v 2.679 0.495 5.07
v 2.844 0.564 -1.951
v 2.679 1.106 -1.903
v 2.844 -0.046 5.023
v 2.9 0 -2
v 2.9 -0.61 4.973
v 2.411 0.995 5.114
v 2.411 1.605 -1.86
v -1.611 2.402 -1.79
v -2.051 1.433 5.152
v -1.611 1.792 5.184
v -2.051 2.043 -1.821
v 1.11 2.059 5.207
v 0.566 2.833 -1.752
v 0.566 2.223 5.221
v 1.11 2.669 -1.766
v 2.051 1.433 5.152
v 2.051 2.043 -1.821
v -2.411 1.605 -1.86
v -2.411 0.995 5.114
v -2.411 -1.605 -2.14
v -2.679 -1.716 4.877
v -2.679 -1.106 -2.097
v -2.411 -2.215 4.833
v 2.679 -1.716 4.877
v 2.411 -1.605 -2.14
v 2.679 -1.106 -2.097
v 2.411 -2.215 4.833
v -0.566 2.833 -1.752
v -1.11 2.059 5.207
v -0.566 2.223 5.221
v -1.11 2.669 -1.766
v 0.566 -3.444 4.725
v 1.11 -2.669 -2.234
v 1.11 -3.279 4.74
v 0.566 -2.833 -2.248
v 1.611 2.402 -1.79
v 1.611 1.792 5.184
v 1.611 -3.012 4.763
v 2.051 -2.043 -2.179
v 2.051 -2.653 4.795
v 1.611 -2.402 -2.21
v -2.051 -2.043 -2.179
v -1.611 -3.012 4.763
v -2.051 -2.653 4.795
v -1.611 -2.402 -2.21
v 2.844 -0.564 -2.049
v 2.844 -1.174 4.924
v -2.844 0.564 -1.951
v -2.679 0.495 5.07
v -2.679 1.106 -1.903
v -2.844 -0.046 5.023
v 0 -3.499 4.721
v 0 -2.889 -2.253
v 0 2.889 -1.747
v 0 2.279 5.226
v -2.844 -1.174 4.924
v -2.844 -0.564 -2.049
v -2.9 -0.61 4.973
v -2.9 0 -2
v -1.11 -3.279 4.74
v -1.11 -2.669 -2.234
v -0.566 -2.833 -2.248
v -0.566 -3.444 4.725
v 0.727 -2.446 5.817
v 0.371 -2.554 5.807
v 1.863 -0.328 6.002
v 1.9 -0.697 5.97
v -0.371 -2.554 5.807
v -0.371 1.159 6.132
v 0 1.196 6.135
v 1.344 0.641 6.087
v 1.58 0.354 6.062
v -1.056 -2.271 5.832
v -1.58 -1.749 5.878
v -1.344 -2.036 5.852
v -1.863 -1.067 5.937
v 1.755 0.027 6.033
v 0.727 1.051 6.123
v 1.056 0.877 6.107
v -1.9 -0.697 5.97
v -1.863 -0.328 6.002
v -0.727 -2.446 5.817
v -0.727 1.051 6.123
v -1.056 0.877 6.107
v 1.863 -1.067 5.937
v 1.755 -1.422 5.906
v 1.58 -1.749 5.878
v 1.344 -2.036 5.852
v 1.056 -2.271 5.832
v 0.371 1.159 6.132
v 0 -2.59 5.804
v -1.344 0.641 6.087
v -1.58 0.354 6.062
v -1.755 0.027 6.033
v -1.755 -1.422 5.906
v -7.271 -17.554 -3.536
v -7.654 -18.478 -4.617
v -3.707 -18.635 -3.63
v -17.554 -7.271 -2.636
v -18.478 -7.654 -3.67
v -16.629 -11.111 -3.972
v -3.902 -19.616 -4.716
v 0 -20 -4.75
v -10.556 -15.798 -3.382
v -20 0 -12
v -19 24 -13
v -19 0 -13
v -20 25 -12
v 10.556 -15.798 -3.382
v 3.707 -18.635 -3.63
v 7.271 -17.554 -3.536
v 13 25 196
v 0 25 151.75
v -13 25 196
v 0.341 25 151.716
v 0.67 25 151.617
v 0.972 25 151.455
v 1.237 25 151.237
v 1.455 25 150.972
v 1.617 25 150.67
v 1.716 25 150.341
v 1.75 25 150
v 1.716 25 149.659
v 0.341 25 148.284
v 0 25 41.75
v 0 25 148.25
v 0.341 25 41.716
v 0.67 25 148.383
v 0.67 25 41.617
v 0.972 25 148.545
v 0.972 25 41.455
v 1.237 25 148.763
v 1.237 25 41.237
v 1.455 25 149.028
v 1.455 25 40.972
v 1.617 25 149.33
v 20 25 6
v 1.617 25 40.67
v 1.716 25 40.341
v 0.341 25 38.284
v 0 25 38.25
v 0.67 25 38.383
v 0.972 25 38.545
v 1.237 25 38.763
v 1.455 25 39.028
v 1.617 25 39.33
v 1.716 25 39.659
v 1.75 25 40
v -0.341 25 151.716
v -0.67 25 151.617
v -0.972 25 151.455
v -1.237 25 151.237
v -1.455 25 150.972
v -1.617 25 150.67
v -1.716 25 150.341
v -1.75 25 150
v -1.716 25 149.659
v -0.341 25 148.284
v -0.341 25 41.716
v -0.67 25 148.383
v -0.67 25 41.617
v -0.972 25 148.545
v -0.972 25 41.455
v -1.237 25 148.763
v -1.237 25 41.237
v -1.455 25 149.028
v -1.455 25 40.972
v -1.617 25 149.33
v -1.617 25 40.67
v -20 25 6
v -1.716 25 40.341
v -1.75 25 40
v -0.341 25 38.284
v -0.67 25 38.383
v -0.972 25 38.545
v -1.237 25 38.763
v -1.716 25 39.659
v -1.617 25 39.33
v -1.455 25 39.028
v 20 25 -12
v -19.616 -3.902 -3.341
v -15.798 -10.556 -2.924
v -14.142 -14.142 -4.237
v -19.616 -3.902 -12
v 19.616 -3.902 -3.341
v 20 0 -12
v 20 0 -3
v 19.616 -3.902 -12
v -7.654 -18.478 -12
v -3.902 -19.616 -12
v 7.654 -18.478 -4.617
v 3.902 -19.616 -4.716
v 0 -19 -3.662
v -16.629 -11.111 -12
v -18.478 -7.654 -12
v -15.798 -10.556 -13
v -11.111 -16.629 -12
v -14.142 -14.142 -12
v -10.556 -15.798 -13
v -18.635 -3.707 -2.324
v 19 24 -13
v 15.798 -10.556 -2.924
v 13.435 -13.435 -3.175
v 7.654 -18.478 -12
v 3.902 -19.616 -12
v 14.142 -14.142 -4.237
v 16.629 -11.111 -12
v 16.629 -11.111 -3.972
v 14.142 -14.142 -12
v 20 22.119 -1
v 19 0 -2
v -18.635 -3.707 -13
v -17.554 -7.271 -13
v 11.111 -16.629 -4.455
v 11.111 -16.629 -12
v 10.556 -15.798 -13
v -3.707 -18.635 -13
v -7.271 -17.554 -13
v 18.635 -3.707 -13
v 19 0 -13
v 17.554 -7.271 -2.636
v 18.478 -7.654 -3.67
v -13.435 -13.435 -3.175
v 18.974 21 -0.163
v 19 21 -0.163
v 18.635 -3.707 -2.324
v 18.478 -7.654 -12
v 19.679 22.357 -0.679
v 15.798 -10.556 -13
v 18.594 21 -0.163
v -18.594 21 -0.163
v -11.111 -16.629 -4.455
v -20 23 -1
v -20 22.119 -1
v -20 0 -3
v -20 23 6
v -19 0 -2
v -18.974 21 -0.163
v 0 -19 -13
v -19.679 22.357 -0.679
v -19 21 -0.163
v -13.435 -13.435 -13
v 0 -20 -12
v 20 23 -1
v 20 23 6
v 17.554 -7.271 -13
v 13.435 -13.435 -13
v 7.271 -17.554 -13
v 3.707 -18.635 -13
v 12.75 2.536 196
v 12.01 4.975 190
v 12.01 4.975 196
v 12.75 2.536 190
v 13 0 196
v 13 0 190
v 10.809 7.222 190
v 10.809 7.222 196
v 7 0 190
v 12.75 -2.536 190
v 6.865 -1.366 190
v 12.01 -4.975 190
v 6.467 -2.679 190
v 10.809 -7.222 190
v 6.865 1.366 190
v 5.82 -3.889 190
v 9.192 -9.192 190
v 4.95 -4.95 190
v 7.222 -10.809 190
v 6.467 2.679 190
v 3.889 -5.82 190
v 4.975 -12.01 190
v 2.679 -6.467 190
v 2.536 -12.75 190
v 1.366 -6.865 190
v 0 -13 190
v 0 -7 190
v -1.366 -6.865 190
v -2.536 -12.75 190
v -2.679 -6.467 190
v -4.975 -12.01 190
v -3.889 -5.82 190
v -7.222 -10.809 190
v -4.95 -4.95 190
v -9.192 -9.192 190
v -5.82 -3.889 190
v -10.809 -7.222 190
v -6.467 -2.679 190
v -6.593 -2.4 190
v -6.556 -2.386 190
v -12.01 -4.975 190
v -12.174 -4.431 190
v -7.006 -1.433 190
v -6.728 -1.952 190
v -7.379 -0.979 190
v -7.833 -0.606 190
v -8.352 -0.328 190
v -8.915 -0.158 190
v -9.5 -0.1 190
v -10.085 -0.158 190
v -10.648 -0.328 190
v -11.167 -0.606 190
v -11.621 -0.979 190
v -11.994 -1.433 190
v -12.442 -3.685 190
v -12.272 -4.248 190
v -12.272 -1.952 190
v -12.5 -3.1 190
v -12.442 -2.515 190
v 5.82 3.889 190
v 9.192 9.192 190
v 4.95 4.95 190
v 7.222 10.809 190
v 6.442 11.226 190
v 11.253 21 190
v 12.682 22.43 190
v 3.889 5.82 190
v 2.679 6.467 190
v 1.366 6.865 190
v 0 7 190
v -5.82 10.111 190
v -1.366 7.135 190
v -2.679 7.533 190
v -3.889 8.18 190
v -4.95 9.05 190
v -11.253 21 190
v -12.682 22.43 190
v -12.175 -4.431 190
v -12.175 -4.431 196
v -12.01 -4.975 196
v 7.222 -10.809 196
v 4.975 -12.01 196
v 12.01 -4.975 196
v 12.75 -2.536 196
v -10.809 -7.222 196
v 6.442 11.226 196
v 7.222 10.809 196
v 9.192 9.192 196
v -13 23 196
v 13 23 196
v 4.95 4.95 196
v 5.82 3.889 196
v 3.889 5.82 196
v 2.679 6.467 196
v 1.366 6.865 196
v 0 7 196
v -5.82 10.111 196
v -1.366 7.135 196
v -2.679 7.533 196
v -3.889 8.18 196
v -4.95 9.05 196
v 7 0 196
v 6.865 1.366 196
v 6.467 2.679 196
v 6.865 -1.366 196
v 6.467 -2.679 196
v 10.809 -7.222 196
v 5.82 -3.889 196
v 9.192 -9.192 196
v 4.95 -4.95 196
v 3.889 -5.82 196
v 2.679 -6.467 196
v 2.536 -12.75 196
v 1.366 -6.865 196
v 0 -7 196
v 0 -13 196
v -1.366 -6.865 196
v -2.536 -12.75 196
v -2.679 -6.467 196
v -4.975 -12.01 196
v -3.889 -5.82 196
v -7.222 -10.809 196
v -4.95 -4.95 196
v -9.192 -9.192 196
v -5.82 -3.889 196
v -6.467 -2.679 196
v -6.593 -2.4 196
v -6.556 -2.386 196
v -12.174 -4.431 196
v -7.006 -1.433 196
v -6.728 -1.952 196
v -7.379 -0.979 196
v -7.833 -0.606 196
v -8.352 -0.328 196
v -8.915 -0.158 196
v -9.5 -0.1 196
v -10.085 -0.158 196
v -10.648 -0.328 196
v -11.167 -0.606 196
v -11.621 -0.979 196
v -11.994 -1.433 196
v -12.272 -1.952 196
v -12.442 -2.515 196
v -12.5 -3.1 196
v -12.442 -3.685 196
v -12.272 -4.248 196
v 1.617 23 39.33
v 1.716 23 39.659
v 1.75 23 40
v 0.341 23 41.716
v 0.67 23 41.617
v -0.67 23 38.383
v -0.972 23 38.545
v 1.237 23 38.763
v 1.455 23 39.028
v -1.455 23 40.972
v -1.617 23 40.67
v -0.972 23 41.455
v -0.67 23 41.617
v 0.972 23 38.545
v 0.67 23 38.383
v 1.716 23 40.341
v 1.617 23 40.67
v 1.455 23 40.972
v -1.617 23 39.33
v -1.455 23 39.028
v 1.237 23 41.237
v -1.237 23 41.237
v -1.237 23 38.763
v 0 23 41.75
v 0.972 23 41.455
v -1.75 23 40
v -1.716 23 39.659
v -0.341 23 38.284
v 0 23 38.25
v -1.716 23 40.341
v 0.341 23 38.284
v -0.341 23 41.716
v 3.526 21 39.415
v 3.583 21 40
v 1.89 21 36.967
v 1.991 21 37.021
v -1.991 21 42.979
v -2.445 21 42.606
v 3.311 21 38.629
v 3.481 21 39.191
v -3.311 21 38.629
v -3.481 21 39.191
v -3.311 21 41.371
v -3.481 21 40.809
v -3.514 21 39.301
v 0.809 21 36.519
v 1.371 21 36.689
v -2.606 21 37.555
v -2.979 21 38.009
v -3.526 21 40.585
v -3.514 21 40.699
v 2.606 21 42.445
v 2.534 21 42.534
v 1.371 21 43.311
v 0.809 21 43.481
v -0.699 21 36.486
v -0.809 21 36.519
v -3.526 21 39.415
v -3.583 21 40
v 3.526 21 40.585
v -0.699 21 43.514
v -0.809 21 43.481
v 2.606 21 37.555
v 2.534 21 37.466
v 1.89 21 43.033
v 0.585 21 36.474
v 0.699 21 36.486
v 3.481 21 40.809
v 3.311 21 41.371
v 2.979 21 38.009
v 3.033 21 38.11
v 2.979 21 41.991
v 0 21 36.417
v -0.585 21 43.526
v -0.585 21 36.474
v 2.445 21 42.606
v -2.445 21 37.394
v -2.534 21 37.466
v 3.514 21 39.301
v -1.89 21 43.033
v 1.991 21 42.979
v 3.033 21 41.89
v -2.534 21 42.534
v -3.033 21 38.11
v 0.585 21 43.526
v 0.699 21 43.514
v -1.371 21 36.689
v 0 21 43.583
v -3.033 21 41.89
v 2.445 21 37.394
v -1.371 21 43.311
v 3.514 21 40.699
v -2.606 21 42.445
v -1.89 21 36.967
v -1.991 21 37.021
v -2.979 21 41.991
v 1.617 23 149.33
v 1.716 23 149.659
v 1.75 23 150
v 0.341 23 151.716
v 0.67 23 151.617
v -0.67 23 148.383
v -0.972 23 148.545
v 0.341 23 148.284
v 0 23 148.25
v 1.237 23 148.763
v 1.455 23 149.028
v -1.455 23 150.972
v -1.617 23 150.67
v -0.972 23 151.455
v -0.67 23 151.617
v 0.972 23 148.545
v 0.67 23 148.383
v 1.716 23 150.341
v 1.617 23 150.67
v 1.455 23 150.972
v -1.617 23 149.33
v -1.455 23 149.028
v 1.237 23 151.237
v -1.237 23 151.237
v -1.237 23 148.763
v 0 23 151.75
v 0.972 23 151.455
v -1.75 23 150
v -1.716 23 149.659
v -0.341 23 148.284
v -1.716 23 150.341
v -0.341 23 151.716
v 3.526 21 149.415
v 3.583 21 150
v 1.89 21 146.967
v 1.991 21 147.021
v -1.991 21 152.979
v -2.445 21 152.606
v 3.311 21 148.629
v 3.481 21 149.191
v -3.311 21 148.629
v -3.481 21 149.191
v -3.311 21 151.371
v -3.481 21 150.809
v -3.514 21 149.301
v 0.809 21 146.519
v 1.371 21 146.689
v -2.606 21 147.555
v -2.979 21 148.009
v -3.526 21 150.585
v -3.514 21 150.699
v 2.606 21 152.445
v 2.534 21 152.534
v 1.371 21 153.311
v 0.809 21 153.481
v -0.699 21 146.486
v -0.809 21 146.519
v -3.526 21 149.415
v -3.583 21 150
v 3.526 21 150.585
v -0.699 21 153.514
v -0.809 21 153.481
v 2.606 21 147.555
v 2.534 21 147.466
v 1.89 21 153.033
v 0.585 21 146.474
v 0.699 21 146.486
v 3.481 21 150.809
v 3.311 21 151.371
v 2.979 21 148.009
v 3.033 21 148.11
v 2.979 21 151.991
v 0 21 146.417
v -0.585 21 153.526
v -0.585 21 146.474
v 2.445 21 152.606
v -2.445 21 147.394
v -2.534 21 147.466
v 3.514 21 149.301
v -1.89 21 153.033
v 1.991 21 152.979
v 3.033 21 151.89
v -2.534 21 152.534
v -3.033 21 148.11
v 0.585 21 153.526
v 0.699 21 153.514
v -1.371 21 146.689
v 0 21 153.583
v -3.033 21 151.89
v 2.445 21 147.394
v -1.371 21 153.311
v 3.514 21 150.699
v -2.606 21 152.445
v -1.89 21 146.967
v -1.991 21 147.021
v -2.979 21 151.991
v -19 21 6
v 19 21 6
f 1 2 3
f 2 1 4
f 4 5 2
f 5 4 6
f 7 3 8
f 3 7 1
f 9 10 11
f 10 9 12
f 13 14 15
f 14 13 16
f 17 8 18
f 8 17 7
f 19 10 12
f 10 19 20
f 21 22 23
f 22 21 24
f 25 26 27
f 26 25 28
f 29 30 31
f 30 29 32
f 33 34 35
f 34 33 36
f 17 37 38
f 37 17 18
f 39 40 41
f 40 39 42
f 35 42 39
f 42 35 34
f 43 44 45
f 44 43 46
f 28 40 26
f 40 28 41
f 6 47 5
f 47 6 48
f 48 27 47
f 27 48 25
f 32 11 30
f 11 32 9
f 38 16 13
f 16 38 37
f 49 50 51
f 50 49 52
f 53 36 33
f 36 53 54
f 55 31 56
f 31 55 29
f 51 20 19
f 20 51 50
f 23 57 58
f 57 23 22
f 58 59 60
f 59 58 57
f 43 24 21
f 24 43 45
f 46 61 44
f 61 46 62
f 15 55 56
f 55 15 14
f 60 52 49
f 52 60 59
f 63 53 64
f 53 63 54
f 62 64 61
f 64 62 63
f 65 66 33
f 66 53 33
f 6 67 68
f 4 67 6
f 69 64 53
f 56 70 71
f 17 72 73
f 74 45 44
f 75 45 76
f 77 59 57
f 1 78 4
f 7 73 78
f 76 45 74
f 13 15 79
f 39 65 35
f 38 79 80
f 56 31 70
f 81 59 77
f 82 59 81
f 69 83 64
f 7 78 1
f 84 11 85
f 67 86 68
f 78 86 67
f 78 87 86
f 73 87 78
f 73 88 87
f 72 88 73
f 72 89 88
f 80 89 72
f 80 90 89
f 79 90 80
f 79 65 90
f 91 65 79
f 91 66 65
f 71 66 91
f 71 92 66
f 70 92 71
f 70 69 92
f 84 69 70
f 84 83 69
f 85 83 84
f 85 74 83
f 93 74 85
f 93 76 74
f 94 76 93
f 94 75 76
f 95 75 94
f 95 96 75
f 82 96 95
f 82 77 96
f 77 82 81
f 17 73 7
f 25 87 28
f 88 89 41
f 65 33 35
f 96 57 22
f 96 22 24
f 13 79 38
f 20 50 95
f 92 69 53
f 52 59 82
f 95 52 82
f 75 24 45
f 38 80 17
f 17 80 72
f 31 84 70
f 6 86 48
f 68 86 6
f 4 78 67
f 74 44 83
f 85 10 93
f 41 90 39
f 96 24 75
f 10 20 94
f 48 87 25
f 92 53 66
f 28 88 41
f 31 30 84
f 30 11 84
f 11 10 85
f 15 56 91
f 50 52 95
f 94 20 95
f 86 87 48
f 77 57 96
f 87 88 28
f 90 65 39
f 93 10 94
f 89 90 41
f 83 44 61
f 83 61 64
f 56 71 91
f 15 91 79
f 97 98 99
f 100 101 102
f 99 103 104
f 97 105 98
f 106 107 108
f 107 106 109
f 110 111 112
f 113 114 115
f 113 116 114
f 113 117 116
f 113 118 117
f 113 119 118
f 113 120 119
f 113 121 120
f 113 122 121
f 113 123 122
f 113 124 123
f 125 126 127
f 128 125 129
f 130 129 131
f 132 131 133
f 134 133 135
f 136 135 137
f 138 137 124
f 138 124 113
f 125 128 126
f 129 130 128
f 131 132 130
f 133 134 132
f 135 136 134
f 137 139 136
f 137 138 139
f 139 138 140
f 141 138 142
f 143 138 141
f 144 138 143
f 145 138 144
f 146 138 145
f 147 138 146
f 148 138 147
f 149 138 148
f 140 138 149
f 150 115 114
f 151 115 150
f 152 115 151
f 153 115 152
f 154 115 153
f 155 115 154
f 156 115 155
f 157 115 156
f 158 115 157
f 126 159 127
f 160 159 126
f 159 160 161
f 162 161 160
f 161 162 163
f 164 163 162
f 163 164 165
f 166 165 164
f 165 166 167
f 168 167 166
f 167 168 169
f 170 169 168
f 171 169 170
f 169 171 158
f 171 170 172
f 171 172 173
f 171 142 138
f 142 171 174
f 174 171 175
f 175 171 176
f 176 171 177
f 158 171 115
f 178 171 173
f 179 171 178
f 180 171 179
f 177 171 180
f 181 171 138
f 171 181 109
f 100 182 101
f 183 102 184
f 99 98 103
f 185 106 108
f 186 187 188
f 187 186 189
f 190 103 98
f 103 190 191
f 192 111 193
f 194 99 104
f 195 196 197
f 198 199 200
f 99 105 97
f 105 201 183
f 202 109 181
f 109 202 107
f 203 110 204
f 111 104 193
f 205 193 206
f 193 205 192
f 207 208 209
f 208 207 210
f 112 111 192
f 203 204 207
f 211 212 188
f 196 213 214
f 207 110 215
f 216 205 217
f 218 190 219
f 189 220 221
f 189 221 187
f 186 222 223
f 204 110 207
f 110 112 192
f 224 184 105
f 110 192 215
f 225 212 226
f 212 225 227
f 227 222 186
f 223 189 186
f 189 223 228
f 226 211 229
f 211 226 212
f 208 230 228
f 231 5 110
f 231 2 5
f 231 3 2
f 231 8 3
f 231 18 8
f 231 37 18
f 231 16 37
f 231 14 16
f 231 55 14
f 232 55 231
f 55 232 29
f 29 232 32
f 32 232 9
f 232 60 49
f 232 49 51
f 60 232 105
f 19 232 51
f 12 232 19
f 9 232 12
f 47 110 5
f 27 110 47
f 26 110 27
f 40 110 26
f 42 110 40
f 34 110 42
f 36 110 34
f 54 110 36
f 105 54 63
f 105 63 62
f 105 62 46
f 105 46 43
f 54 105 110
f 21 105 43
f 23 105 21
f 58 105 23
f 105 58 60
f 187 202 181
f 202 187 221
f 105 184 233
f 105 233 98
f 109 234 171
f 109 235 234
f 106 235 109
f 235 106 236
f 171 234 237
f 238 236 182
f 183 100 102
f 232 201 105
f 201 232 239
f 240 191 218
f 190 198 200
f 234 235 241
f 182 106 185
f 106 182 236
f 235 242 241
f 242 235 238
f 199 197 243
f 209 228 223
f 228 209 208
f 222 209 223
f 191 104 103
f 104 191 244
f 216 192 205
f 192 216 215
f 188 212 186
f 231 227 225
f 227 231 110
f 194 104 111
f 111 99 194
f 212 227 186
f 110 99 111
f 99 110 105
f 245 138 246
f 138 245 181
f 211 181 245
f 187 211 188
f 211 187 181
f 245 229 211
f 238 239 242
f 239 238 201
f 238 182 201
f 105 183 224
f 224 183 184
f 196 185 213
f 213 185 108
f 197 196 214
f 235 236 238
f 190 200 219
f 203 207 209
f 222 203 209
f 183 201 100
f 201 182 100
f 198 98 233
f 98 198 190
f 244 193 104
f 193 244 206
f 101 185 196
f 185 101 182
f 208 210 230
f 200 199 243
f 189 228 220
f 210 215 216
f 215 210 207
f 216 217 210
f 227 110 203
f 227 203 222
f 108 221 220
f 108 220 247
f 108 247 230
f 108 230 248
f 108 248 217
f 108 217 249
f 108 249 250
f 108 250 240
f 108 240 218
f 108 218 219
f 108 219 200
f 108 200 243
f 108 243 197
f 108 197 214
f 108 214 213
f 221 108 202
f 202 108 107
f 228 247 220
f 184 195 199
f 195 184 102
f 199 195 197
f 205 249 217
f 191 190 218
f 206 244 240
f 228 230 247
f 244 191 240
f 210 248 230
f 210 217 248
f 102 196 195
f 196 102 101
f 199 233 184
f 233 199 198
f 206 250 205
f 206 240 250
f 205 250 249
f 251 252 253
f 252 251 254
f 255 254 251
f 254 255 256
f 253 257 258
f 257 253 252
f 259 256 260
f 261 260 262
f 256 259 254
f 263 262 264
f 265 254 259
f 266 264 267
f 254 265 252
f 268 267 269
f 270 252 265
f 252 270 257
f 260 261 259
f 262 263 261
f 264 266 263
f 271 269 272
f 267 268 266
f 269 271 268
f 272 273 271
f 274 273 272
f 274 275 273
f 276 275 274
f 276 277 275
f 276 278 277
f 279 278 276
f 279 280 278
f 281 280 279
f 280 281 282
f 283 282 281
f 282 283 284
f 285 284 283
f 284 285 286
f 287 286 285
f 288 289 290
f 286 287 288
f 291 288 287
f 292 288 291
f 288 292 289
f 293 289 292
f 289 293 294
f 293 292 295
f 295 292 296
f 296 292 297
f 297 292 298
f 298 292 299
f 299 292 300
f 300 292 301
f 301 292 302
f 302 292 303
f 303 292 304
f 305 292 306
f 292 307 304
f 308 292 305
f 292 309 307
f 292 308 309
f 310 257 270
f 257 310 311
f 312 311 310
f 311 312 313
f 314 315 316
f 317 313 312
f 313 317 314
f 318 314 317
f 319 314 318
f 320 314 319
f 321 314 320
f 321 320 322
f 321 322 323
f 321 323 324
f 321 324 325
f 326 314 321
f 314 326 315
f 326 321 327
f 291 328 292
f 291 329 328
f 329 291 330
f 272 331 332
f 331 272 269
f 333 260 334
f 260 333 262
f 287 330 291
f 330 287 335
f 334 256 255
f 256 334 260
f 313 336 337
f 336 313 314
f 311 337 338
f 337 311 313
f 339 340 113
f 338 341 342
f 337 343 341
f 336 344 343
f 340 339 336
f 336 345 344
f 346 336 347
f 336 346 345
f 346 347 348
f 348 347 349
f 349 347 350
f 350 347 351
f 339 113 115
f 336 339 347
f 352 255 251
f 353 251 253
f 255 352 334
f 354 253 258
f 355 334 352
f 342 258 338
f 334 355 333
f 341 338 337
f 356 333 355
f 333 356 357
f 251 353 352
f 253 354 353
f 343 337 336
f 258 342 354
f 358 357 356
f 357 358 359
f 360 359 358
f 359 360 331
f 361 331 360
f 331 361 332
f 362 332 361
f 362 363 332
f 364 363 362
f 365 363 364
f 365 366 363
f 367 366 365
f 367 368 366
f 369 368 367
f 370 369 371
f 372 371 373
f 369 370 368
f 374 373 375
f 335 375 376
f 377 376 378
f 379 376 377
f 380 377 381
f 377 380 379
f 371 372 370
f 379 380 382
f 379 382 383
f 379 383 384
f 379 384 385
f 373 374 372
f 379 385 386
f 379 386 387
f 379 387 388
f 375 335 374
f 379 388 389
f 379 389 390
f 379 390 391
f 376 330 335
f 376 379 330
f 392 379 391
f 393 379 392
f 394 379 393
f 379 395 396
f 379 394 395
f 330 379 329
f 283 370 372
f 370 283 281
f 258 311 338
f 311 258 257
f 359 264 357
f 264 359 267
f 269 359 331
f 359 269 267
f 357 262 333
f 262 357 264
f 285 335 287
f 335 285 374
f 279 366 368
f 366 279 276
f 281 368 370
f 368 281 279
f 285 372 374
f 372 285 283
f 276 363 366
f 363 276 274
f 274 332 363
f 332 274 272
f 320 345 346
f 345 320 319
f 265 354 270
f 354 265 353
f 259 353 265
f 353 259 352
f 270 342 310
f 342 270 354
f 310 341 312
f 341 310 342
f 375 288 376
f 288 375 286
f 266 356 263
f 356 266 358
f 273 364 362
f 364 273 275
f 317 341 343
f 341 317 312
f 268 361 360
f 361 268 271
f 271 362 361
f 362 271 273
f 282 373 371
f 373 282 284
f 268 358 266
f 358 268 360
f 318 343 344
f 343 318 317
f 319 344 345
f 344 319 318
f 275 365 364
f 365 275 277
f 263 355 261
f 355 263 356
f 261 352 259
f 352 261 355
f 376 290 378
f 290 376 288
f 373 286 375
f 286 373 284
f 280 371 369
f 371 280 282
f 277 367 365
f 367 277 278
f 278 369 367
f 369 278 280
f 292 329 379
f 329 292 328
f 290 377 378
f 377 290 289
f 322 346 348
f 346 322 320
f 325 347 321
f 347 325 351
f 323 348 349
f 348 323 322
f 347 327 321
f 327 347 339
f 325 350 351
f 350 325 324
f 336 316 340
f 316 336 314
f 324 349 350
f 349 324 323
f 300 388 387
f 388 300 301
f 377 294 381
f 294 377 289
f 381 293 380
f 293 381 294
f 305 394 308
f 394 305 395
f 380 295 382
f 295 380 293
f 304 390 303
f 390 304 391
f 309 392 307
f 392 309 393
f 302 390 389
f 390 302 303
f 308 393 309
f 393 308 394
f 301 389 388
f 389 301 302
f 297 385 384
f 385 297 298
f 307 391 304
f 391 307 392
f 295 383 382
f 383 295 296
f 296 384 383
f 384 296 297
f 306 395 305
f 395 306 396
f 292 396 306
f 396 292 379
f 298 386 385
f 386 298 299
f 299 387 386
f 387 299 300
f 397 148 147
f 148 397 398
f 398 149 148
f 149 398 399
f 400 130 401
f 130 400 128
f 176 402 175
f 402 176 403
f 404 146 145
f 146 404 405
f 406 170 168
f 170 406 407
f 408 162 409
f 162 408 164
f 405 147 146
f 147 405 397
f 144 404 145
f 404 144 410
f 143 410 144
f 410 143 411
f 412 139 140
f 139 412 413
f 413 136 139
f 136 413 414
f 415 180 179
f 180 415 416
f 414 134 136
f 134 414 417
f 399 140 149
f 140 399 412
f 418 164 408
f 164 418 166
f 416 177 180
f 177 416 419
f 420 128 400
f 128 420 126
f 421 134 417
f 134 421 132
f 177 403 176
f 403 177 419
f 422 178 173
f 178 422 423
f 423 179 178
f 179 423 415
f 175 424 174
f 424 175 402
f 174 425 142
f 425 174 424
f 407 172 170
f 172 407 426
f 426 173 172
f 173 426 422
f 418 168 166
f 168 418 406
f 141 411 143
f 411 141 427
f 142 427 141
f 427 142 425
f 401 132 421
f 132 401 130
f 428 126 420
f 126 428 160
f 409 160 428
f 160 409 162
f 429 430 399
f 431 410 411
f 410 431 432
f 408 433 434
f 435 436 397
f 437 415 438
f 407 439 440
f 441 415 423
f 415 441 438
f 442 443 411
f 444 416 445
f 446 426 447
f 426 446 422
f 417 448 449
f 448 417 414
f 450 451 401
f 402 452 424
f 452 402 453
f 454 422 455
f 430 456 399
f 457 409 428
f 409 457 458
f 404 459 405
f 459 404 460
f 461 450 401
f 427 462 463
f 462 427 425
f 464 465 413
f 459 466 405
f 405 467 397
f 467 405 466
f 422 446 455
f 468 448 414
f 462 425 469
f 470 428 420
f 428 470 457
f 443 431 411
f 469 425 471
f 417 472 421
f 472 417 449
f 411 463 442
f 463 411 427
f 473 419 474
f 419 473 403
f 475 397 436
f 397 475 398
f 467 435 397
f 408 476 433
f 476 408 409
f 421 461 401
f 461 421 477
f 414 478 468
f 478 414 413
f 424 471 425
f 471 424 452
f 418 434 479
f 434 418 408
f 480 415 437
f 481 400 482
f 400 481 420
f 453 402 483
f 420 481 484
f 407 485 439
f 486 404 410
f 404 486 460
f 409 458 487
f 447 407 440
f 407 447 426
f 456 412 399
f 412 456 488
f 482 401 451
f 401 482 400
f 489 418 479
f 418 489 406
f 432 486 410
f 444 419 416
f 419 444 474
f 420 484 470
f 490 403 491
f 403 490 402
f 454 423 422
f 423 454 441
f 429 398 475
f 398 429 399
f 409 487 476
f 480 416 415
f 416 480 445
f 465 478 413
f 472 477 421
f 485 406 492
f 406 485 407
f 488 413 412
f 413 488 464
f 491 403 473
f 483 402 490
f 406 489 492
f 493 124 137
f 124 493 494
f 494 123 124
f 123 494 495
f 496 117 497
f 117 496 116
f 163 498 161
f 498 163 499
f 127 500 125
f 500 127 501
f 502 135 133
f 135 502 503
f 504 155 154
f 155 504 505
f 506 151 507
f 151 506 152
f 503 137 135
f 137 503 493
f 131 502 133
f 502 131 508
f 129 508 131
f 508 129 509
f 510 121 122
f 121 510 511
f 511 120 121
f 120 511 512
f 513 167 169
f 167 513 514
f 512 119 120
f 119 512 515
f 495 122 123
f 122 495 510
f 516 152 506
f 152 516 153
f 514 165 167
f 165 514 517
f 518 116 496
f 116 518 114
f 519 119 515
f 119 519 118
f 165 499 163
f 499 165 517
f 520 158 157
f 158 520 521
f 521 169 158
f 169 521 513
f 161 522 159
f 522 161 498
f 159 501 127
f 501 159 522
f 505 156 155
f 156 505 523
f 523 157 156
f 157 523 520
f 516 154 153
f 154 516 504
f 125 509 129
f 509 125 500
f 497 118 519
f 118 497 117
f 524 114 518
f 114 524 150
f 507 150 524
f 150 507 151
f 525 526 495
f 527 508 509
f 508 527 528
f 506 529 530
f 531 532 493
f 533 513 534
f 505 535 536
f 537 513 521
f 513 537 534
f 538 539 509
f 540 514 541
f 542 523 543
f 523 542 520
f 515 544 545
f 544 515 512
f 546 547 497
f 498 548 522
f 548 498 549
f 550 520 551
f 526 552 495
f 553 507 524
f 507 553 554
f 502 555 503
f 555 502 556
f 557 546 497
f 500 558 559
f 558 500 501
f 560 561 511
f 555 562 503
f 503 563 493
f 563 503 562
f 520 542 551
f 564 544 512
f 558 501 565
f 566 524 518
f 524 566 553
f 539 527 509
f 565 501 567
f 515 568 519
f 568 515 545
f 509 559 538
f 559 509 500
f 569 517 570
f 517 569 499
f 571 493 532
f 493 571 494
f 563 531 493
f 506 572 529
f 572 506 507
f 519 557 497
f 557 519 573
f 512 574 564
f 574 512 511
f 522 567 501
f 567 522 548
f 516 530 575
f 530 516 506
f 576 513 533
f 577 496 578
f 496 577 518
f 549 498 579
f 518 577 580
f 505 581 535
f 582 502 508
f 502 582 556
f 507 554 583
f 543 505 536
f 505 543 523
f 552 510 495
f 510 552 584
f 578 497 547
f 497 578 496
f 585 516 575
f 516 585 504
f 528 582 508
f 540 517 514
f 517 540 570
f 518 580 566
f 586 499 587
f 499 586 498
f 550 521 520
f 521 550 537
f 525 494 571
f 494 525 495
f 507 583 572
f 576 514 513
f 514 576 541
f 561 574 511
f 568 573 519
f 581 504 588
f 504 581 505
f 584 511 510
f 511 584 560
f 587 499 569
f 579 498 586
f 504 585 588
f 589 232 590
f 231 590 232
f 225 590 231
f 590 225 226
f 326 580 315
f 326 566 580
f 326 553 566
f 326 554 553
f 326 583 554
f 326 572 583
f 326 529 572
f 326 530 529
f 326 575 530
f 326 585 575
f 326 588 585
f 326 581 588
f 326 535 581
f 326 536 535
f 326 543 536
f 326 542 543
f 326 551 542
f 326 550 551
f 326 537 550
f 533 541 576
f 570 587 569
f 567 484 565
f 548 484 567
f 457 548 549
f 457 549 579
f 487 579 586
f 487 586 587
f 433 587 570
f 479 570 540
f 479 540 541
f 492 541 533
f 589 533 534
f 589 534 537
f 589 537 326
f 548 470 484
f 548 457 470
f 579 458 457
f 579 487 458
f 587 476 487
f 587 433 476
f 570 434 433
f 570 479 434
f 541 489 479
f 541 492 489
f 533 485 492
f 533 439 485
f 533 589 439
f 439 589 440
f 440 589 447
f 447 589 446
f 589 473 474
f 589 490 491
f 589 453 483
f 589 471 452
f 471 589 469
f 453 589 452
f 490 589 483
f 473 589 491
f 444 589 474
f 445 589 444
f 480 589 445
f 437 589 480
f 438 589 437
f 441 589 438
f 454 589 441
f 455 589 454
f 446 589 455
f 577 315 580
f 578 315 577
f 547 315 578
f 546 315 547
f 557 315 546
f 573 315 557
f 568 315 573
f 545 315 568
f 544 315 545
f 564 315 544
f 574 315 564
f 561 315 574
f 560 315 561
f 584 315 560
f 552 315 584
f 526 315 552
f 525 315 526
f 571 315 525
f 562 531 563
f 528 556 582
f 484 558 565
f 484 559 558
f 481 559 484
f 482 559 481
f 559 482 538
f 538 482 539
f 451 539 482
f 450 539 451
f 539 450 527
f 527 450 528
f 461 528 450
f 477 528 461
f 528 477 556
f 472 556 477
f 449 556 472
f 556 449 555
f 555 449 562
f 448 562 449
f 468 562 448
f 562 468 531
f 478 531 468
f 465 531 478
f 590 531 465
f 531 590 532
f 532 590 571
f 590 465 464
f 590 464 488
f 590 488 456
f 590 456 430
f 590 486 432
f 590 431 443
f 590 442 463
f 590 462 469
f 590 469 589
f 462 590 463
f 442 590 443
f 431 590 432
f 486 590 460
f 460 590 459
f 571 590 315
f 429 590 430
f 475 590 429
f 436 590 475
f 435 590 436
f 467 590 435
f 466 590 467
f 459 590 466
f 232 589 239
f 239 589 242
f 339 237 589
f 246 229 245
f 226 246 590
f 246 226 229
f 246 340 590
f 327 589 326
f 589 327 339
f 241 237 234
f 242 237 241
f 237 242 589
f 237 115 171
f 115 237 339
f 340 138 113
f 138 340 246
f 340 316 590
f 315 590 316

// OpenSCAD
/**
 * Martin Egli
 * 2023-02-12
 * holder for toothbrushes
 */

// v1.0
// phillips sonicare HX367W1 220926, adult
// simplified re-design, bottom is not a circle
module tbrush1(loc_res = 32) {
    color("LightBlue")
    difference() {
        union() {
            translate([0, 0, 0])
            cylinder(d = 26, h = 130, $fn = loc_res);
            translate([0, 0, 130])
            cylinder(d1 = 26, d2 = 19, h = 20, $fn = loc_res);
            translate([0, 0, 150])
            sphere(d = 19, $fn = loc_res);
            translate([0, 0, 150])
            cylinder(d = 8.5, h = 40, $fn = loc_res);
        }
        translate([0, 0, -1])
        cylinder(d = 6.2, h = 8.2+1, $fn = loc_res);
    }
}

// phillips sonicare HX6910 110318, adult
// simplified re-design, bottom is not a circle
module tbrush2(loc_res = 32) {
    color("LightGreen")
    difference() {
        union() {
            translate([0, 0, 0])
            cylinder(d1 = 31, d2 = 29, h = 130, $fn = loc_res);
            translate([0, 0, 130])
            cylinder(d1 = 29, d2 = 19, h = 30, $fn = loc_res);
            translate([0, 0, 160])
            sphere(d = 19, $fn = loc_res);
            translate([0, 0, 160])
            cylinder(d = 8.5, h = 40, $fn = loc_res);
        }
        translate([0, 0, -1])
        cylinder(d = 6.2, h = 8.2+1, $fn = loc_res);
    }
}

// phillips sonicare HX6910 110318, child
// simplified re-design, bottom is not a circle
module tbrush3(loc_res = 32) {
    color("HotPink")
    difference() {
        union() {
            translate([0, 0, 0])
            cylinder(d1 = 35, d2 = 31, h = 155, $fn = loc_res);
            translate([0, 0, 155])
            cylinder(d1 = 31, d2 = 18, h = 5, $fn = loc_res);
            translate([0, 0, 160])
            cylinder(d1 = 18, d2 = 9, h = 13, $fn = loc_res);
            translate([0, 0, 160+13])
            cylinder(d1 = 9, d2 = 7,h = 40, $fn = loc_res);
        }
        translate([0, 0, -1])
        cylinder(d = 6.2, h = 8.2+1, $fn = loc_res);
    }
}

module charging_dock1(loc_res = 32) {
    color("LightGray") // instead of white
    union() {
        translate([0, 0, 0])
        cylinder(d1 = 6.5, d2 = 6.0, h = 7.7, $fn = loc_res);
        translate([0, 0, -22])
        cylinder(d = 40, h = 22, $fn = loc_res);
        translate([-40/2, 0, -22])
        cube([40, 31, 22]);
    }
}

module tbholder1(loc_res = 32) {
    // base plate
    union() {
        hull() {
            difference() {
                hull() {
                    translate([0, 0, -12])
                    cylinder(d = 40, h = 11, $fn = loc_res);
                    translate([-40/2, 0, -12])
                    cube([40, 25, 11]);
                }
                translate([0, 0, -3])
                rotate([5, 0, 0])
                cylinder(d = 60, h = 8, $fn = loc_res);
            }
            difference() {
                hull() {
                    translate([0, 0, -13])
                    cylinder(d = 38, h = 13, $fn = loc_res);
                    translate([-38/2, 0, -13])
                    cube([38, 24, 13]);
                }
                translate([0, 0, -2])
                rotate([5, 0, 0])
                cylinder(d = 60, h = 8, $fn = loc_res);
            }
        }
        // middle pin
        translate([0, 0, -2])
        rotate([5, 0, 0])
        union() {
            translate([0, 0, 0])
            cylinder(d = 5.8, h = 7, $fn = loc_res);
            translate([0, 0, 7])
            cylinder(d1 = 5.8, d2 = 5.8-2, h = 1, $fn = loc_res);
        }
    }
    // upper holder
    translate([0, 0, 190]) { //190
        hull() {
            translate([-26/2, 23, 0])
            cube([26, 2, 6]);
            translate([0, 14, -0])
            cylinder(d=14, h = 6, $fn = loc_res);
        }
        difference() {
            translate([0, 0, -0])
            cylinder(d = 26, h = 6, $fn = loc_res);
            translate([0, 0, -1])
            cylinder(d = 14, h = 15, $fn = loc_res);
            translate([0, 0, -1])
            rotate([0, 0, 110])
            cube([16, 16, 12]);
            translate([-16, 0, -1])
            cube([16, 16, 12]);
        }
        translate([-(14/2)-2.5, -3.1, 0])
        cylinder(d = (26-14)/2, h = 6, $fn = loc_res);
    }
    
    // back connector ans mounting holes
    difference() {
        hull() {
            translate([0, 0, 190])
            hull() {
                translate([-26/2, 23, 0])
                cube([26, 2, 6]);
                translate([-22/2, 21, 0])
                cube([22, 3, 6]);
            }
            translate([0, 0, -10])
            hull() {
                translate([-40/2, 23, 0])
                cube([40, 2, 16]);
                translate([-38/2, 21, 0])
                cube([38, 3, 16]);
            }
        }
            
        // mounting holes
        translate([0, 20, 40]) {
            rotate([-90, 0, 0])
            cylinder(d = 3.5, h = 10, $fn = loc_res);
            rotate([-90, 0, 0])
            cylinder(d2 = 3.5, d1= 9, h = 3, $fn = loc_res);
        }
        translate([0, 20, 150]) {
            rotate([-90, 0, 0])
            cylinder(d = 3.5, h = 10, $fn = loc_res);
            rotate([-90, 0, 0])
            cylinder(d2 = 3.5, d1= 9, h = 3, $fn = loc_res);
        }
    }
}

module tbrush1_test() {
    tbholder1();
    difference() {
        tbrush1();
        *cube(100);
    }
}

module tbrush2_test() {
    tbholder1();
    tbrush2();
}

module tbrush3_test() {
    tbholder1();
    tbrush3();
}
*translate([ 50, 0, 0])
tbrush1_test();
*translate([100, 0, 0])
tbrush2_test();
*translate([150, 0, 0])
tbrush3_test();
*translate([-50, 0, 0])
charging_dock1();

tbholder1();
